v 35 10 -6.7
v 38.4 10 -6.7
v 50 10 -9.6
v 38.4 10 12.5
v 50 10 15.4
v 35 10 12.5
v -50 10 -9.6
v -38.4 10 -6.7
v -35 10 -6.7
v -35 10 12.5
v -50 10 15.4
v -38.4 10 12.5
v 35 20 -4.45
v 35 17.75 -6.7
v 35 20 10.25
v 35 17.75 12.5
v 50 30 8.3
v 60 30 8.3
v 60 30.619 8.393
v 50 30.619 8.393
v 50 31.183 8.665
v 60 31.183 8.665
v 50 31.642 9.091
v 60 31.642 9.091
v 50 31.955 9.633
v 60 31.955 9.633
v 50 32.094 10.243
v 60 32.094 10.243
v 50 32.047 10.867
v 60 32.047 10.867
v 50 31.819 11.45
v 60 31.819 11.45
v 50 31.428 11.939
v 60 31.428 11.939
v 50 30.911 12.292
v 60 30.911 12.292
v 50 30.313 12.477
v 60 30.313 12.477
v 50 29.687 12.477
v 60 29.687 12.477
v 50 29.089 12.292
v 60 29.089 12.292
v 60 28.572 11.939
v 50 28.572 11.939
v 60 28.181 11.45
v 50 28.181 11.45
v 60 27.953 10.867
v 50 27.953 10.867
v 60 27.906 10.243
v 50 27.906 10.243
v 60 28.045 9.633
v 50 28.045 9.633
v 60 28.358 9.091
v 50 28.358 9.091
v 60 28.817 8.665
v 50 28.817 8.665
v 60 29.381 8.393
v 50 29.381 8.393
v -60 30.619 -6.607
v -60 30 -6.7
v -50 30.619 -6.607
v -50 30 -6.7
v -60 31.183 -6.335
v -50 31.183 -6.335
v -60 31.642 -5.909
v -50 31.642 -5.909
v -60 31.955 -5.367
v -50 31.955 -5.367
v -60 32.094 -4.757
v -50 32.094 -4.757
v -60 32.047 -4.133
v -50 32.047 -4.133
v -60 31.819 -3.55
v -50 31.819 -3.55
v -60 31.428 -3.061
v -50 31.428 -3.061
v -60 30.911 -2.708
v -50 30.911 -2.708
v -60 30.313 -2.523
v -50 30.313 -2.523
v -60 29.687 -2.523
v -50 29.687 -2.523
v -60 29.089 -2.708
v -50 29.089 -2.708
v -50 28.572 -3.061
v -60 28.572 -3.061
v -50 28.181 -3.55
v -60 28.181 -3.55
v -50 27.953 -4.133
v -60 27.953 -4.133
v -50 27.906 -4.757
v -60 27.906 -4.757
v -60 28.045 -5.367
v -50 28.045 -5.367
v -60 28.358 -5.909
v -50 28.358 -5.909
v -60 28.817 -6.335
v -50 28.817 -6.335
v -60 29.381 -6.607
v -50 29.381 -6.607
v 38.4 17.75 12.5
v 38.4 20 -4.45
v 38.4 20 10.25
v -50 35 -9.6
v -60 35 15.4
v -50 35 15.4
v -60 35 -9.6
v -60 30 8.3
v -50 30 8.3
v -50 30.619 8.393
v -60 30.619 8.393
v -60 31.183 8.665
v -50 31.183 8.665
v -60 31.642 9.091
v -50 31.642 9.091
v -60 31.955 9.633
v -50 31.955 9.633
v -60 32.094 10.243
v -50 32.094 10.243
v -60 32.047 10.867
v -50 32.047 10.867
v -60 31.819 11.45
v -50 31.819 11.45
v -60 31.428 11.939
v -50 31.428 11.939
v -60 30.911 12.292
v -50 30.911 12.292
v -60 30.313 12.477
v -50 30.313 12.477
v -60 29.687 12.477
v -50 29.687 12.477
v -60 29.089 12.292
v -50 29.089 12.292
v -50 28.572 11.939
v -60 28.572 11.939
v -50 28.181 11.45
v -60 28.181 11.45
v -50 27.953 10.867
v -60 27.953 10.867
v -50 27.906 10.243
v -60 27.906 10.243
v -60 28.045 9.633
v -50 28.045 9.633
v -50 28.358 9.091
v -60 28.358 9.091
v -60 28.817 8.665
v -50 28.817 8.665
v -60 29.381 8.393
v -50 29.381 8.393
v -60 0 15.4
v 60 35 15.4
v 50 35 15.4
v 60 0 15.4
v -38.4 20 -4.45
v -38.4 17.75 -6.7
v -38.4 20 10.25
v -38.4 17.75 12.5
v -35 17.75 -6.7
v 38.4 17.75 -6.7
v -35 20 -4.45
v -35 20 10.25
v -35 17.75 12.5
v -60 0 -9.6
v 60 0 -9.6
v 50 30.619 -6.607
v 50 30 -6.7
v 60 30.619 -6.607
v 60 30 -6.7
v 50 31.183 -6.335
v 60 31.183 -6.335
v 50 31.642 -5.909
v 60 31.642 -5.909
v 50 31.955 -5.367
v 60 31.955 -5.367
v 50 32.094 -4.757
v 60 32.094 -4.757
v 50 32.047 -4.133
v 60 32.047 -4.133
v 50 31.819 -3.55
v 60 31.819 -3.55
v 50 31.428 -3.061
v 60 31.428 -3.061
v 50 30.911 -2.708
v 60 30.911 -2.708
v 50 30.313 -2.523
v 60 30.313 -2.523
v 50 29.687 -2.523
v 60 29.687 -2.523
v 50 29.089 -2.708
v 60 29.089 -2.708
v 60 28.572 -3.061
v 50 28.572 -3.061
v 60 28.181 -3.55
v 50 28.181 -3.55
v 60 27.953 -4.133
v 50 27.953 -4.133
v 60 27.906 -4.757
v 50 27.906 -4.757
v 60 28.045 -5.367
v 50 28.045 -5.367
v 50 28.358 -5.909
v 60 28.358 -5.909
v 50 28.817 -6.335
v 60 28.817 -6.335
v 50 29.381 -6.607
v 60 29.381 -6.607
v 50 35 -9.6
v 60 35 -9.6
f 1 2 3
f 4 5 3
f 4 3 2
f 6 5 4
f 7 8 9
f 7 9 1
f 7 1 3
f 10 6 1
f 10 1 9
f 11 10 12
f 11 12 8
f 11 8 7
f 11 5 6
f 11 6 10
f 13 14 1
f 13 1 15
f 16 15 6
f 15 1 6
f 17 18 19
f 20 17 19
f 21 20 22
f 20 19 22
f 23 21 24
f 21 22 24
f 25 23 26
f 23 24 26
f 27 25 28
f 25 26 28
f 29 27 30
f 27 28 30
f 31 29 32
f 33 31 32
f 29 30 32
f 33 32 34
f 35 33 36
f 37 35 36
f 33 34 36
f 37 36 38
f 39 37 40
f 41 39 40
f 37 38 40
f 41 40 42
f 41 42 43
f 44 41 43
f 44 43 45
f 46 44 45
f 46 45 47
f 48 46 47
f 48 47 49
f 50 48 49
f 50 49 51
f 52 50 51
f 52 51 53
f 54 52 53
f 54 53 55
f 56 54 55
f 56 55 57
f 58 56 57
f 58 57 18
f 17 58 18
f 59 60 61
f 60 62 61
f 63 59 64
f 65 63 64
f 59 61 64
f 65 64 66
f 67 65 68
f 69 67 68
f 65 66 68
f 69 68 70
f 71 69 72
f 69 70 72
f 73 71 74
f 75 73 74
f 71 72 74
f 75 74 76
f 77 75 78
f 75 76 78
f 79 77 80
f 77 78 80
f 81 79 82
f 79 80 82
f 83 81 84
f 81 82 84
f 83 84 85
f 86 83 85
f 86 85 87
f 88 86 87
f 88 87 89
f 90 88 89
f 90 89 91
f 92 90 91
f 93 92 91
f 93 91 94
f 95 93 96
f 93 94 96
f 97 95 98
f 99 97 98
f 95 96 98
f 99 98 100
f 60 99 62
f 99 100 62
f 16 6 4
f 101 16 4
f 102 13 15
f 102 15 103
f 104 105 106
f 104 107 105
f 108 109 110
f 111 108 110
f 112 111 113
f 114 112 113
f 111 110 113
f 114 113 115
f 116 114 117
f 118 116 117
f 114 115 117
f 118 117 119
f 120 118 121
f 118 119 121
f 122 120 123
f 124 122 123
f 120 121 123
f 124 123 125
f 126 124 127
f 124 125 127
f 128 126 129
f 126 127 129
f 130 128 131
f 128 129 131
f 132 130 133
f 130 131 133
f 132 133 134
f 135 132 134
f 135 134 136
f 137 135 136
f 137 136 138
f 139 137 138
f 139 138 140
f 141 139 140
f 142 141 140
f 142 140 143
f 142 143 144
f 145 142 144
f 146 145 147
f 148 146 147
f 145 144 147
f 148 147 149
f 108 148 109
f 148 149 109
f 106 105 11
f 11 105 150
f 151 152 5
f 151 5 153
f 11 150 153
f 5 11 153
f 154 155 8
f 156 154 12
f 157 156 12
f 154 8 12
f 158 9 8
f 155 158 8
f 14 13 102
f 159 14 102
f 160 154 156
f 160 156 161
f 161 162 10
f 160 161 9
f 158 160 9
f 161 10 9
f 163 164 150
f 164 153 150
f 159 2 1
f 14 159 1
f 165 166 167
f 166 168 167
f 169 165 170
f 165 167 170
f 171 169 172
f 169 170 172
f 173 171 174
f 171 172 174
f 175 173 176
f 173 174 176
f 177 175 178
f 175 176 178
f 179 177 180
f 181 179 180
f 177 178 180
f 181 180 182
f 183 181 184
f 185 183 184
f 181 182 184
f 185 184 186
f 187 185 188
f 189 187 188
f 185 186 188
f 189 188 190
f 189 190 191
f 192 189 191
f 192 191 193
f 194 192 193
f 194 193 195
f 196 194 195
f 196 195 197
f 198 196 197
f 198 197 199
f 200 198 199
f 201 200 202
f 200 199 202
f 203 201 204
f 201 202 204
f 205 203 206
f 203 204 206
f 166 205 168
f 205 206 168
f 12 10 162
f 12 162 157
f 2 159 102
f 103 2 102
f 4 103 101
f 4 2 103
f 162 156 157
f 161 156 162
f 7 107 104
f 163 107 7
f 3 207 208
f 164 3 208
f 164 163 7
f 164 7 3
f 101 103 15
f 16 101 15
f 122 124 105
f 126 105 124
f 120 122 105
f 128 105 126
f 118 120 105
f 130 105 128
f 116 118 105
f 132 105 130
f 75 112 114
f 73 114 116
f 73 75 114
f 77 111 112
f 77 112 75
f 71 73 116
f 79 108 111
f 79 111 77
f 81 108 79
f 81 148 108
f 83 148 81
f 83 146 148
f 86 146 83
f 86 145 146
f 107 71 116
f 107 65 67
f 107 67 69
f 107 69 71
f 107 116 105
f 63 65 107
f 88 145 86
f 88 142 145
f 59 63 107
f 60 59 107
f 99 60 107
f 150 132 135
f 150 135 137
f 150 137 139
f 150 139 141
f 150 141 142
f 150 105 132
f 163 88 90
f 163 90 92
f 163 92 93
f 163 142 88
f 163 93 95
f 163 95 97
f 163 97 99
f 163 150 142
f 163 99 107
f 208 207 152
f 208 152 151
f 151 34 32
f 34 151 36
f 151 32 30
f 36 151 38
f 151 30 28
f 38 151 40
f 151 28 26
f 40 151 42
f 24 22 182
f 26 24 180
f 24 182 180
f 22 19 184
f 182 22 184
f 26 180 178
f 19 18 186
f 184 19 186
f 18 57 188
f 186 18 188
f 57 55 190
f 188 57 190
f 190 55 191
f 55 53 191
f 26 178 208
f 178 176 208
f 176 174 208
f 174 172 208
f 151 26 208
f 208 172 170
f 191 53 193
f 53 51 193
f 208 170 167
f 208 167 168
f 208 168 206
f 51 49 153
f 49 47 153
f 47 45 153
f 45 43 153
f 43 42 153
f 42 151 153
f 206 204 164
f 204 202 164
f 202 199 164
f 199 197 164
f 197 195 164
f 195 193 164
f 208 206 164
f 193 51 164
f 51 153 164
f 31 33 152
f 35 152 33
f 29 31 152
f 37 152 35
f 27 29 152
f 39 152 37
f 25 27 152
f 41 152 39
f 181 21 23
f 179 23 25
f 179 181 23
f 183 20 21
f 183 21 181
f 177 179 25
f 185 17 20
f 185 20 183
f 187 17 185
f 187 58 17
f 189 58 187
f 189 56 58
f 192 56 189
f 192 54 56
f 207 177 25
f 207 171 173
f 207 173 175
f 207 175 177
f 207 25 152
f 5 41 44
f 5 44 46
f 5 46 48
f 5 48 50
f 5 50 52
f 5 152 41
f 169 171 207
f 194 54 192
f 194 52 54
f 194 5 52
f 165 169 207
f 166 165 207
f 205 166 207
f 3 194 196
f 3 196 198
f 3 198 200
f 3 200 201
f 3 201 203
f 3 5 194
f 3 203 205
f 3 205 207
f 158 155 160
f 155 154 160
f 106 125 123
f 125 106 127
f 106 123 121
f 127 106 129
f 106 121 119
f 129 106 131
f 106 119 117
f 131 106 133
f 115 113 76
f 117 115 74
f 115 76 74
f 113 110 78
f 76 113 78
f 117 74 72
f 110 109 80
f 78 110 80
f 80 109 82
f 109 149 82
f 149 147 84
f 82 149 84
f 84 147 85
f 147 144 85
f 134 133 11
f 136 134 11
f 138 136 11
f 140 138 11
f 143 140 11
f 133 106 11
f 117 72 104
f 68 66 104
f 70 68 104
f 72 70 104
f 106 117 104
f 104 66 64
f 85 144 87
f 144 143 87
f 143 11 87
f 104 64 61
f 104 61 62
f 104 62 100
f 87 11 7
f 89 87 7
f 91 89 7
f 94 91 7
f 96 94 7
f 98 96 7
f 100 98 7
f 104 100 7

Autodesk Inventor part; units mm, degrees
ref_plane "YZ Plane" through (0, 0, 0) normal (1, 0, 0) x (0, 1, 0)
ref_plane "XZ Plane" through (0, 0, 0) normal (0, 1, 0) x (-1, 0, 0)
ref_plane "XY Plane" through (0, 0, 0) normal (0, 0, 1) x (1, 0, 0)
sketch "Эскиз1" plane through (0, 0, 0) normal (0, 1, 0) x (-1, 0, 0)
  line L0 (50, 15.4) -> (40.5, 15.4)
  line L1 (50, 15.4) -> (-50, 15.4)
  line L2 (-50, -9.6) -> (-50, 15.4)
  line L3 (50, -9.6) -> (40.5, -9.6)
  line L4 (50, -9.6) -> (-50, -9.6)
  line L5 (50, 15.4) -> (-50, 15.4)
  line L6 (-50, 15.4) -> (-50, -9.6)
  line L7 (-50, -9.6) -> (50, -9.6)
  line L8 (50, -9.6) -> (50, 15.4)
  line L9 (38.4, 12.5) -> (38.4, -6.7)
  line L10 (38.4, 12.5) -> (35, 12.5)
  line L11 (35, 12.5) -> (35, -6.7)
  line L12 (35, -6.7) -> (38.4, -6.7)
  line L13 (38.4, -6.7) -> (38.4, 12.5)
  line L14 (-35, -9.6) -> (-35, 15.4)
  line L15 (-35, -9.6) -> (-38.4, -9.6)
  line L16 (-35, 15.4) -> (-38.4, 15.4)
  line L17 (-38.4, 15.4) -> (-38.4, -9.6)
  line L18 (-38.4, -9.6) -> (-35, -9.6)
  line L19 (-35, -9.6) -> (-35, 15.4)
  line L20 (50, 15.4) -> (60, 15.4)
  line L21 (60, 15.4) -> (60, -9.6)
  line L22 (60, -9.6) -> (50, -9.6)
  line L23 (50, -9.6) -> (50, 15.4)
  line L24 (-50, 15.4) -> (-60, 15.4)
  line L25 (-60, 15.4) -> (-60, -9.6)
  line L26 (-60, -9.6) -> (-50, -9.6)
  line L27 (-50, -9.6) -> (-50, 15.4)
  line L28 (-35, -6.7) -> (-38.4, -6.7)
  line L29 (-35, 12.5) -> (-38.4, 12.5)
  point P0 (0, 0)
  point P1 (0, 0)
  point P2 (50, 15.4)
  dimension "d10" = 25
  dimension "d1" = 10
  dimension "d2" = 10
  dimension "d9" = 25
  dimension "d11" = 2.9
  dimension "d12" = 25
  dimension "d13" = 2.9
  dimension "d15" = 2.9
extrude "Выдавливание1" add sketch "Эскиз1" along normal blind 10 contours L8 L3 L4 L14 L1 L0 | L20 L21 L22 L8 | L14 L29 L17 L1 | L17 L4 L2 L1 | L14 L28 L17 L29 | L4 L17 L28 L14 | L2 L26 L25 L24 | L9 L12 L11 L10
sketch "Эскиз2" plane through (0, 10, 0) normal (0, 1, 0) x (1, 0, 0)
  line L0 (-60, 9.6) -> (-60, -15.4) projected
  line L1 (60, 9.6) -> (-60, 9.6) projected
  line L2 (-60, -15.4) -> (60, -15.4)
  line L3 (60, -15.4) -> (60, 9.6)
  line L4 (60, 9.6) -> (-60, 9.6)
  line L5 (-60, 9.6) -> (-60, -15.4)
  line L6 (60, -15.4) -> (60, 9.6) projected
  line L7 (60, -15.4) -> (50, -15.4)
  line L8 (50, -15.4) -> (50, 9.6)
  line L9 (50, 9.6) -> (60, 9.6)
  line L10 (60, 9.6) -> (60, -15.4)
  line L11 (-60, -15.4) -> (60, -15.4) projected
  line L12 (-60, -15.4) -> (-50, -15.4)
  line L13 (-50, -15.4) -> (-50, 9.6)
  line L14 (-50, 9.6) -> (-60, 9.6)
  line L15 (-60, 9.6) -> (-60, -15.4)
  dimension "d16" = 10
  dimension "d17" = 10
extrude "Выдавливание2" add sketch "Эскиз2" along normal blind 25 contours L1 L13 L2 L0 | L1 L3 L2 L8
sketch "Эскиз3" plane through (60, 0, 15.4) normal (1, 0, 0) x (0, 0, -1)
  line L0 (0, 25) -> (0, 35)
  line L1 (0, 30) -> (25, 30)
  line L2 (25, 25) -> (25, 35)
  circle A0 centre (5, 30) radius 2.1
  circle A1 centre (20, 30) radius 2.1
  line L3 (0, 35) -> (25, 35) projected
  point P0 (15.4, 0)
  point P1 (50, 0)
  dimension "d18" = 4.2
  dimension "d19" = 4.2
  dimension "d20" = 5
  dimension "d21" = 5
extrude "Выдавливание3" cut sketch "Эскиз3" against normal blind 127.5 contours A0 L1 | L1 A0 | A1 L1 | L1 A1
sketch "Эскиз4" plane through (0, 10, 0) normal (0, 1, 0) x (1, 0, 0)
  line L0 (50, 9.6) -> (40.5, 9.6)
  line L1 (50, 9.6) -> (-50, 9.6)
  line L2 (-50, -15.4) -> (-50, 9.6)
  line L3 (50, -15.4) -> (40.5, -15.4)
  line L4 (50, -15.4) -> (-50, -15.4)
  line L5 (50, 9.6) -> (-50, 9.6)
  line L6 (-50, 9.6) -> (-50, -15.4)
  line L7 (-50, -15.4) -> (50, -15.4)
  line L8 (50, -15.4) -> (50, 9.6)
  line L9 (38.4, 6.7) -> (38.4, -12.5)
  line L10 (38.4, 6.7) -> (35, 6.7)
  line L11 (35, 6.7) -> (35, -12.5)
  line L12 (35, -12.5) -> (38.4, -12.5)
  line L13 (38.4, -12.5) -> (38.4, 6.7)
  line L14 (-35, -15.4) -> (-35, 9.6)
  line L15 (-35, -15.4) -> (-38.4, -15.4)
  line L16 (-35, 9.6) -> (-38.4, 9.6)
  line L17 (-38.4, 9.6) -> (-38.4, -15.4)
  line L18 (-38.4, -15.4) -> (-35, -15.4)
  line L19 (-35, -15.4) -> (-35, 9.6)
  line L20 (50, 9.6) -> (60, 9.6)
  line L21 (60, 9.6) -> (60, -15.4)
  line L22 (60, -15.4) -> (50, -15.4)
  line L23 (50, -15.4) -> (50, 9.6)
  line L24 (-50, 9.6) -> (-60, 9.6)
  line L25 (-60, 9.6) -> (-60, -15.4)
  line L26 (-60, -15.4) -> (-50, -15.4)
  line L27 (-50, -15.4) -> (-50, 9.6)
  line L28 (-35, -12.5) -> (-38.4, -12.5)
  line L29 (-35, 6.7) -> (-38.4, 6.7)
  point P0 (0, 0)
  point P1 (0, 0)
  point P2 (0, 0)
  point P3 (50, 9.6)
  dimension "d27" = 25
  dimension "d24" = 10
  dimension "d25" = 10
  dimension "d26" = 25
  dimension "d28" = 2.9
  dimension "d29" = 25
  dimension "d30" = 2.9
  dimension "d31" = 2.9
extrude "Выдавливание4" add sketch "Эскиз4" along normal blind 10 contours L14 L28 L17 L29 | L9 L12 L11 L10
chamfer "Фаска1" distance 2.25 angle 45 4 edges at (-36.7, 20, 12.5) (-36.7, 20, -6.7) (36.7, 20, 12.5) (36.7, 20, -6.7)
equation "\"d19\" = d18"
equation "\"d20\" = d21"
properties part number "000.201 - Балка несущая"
